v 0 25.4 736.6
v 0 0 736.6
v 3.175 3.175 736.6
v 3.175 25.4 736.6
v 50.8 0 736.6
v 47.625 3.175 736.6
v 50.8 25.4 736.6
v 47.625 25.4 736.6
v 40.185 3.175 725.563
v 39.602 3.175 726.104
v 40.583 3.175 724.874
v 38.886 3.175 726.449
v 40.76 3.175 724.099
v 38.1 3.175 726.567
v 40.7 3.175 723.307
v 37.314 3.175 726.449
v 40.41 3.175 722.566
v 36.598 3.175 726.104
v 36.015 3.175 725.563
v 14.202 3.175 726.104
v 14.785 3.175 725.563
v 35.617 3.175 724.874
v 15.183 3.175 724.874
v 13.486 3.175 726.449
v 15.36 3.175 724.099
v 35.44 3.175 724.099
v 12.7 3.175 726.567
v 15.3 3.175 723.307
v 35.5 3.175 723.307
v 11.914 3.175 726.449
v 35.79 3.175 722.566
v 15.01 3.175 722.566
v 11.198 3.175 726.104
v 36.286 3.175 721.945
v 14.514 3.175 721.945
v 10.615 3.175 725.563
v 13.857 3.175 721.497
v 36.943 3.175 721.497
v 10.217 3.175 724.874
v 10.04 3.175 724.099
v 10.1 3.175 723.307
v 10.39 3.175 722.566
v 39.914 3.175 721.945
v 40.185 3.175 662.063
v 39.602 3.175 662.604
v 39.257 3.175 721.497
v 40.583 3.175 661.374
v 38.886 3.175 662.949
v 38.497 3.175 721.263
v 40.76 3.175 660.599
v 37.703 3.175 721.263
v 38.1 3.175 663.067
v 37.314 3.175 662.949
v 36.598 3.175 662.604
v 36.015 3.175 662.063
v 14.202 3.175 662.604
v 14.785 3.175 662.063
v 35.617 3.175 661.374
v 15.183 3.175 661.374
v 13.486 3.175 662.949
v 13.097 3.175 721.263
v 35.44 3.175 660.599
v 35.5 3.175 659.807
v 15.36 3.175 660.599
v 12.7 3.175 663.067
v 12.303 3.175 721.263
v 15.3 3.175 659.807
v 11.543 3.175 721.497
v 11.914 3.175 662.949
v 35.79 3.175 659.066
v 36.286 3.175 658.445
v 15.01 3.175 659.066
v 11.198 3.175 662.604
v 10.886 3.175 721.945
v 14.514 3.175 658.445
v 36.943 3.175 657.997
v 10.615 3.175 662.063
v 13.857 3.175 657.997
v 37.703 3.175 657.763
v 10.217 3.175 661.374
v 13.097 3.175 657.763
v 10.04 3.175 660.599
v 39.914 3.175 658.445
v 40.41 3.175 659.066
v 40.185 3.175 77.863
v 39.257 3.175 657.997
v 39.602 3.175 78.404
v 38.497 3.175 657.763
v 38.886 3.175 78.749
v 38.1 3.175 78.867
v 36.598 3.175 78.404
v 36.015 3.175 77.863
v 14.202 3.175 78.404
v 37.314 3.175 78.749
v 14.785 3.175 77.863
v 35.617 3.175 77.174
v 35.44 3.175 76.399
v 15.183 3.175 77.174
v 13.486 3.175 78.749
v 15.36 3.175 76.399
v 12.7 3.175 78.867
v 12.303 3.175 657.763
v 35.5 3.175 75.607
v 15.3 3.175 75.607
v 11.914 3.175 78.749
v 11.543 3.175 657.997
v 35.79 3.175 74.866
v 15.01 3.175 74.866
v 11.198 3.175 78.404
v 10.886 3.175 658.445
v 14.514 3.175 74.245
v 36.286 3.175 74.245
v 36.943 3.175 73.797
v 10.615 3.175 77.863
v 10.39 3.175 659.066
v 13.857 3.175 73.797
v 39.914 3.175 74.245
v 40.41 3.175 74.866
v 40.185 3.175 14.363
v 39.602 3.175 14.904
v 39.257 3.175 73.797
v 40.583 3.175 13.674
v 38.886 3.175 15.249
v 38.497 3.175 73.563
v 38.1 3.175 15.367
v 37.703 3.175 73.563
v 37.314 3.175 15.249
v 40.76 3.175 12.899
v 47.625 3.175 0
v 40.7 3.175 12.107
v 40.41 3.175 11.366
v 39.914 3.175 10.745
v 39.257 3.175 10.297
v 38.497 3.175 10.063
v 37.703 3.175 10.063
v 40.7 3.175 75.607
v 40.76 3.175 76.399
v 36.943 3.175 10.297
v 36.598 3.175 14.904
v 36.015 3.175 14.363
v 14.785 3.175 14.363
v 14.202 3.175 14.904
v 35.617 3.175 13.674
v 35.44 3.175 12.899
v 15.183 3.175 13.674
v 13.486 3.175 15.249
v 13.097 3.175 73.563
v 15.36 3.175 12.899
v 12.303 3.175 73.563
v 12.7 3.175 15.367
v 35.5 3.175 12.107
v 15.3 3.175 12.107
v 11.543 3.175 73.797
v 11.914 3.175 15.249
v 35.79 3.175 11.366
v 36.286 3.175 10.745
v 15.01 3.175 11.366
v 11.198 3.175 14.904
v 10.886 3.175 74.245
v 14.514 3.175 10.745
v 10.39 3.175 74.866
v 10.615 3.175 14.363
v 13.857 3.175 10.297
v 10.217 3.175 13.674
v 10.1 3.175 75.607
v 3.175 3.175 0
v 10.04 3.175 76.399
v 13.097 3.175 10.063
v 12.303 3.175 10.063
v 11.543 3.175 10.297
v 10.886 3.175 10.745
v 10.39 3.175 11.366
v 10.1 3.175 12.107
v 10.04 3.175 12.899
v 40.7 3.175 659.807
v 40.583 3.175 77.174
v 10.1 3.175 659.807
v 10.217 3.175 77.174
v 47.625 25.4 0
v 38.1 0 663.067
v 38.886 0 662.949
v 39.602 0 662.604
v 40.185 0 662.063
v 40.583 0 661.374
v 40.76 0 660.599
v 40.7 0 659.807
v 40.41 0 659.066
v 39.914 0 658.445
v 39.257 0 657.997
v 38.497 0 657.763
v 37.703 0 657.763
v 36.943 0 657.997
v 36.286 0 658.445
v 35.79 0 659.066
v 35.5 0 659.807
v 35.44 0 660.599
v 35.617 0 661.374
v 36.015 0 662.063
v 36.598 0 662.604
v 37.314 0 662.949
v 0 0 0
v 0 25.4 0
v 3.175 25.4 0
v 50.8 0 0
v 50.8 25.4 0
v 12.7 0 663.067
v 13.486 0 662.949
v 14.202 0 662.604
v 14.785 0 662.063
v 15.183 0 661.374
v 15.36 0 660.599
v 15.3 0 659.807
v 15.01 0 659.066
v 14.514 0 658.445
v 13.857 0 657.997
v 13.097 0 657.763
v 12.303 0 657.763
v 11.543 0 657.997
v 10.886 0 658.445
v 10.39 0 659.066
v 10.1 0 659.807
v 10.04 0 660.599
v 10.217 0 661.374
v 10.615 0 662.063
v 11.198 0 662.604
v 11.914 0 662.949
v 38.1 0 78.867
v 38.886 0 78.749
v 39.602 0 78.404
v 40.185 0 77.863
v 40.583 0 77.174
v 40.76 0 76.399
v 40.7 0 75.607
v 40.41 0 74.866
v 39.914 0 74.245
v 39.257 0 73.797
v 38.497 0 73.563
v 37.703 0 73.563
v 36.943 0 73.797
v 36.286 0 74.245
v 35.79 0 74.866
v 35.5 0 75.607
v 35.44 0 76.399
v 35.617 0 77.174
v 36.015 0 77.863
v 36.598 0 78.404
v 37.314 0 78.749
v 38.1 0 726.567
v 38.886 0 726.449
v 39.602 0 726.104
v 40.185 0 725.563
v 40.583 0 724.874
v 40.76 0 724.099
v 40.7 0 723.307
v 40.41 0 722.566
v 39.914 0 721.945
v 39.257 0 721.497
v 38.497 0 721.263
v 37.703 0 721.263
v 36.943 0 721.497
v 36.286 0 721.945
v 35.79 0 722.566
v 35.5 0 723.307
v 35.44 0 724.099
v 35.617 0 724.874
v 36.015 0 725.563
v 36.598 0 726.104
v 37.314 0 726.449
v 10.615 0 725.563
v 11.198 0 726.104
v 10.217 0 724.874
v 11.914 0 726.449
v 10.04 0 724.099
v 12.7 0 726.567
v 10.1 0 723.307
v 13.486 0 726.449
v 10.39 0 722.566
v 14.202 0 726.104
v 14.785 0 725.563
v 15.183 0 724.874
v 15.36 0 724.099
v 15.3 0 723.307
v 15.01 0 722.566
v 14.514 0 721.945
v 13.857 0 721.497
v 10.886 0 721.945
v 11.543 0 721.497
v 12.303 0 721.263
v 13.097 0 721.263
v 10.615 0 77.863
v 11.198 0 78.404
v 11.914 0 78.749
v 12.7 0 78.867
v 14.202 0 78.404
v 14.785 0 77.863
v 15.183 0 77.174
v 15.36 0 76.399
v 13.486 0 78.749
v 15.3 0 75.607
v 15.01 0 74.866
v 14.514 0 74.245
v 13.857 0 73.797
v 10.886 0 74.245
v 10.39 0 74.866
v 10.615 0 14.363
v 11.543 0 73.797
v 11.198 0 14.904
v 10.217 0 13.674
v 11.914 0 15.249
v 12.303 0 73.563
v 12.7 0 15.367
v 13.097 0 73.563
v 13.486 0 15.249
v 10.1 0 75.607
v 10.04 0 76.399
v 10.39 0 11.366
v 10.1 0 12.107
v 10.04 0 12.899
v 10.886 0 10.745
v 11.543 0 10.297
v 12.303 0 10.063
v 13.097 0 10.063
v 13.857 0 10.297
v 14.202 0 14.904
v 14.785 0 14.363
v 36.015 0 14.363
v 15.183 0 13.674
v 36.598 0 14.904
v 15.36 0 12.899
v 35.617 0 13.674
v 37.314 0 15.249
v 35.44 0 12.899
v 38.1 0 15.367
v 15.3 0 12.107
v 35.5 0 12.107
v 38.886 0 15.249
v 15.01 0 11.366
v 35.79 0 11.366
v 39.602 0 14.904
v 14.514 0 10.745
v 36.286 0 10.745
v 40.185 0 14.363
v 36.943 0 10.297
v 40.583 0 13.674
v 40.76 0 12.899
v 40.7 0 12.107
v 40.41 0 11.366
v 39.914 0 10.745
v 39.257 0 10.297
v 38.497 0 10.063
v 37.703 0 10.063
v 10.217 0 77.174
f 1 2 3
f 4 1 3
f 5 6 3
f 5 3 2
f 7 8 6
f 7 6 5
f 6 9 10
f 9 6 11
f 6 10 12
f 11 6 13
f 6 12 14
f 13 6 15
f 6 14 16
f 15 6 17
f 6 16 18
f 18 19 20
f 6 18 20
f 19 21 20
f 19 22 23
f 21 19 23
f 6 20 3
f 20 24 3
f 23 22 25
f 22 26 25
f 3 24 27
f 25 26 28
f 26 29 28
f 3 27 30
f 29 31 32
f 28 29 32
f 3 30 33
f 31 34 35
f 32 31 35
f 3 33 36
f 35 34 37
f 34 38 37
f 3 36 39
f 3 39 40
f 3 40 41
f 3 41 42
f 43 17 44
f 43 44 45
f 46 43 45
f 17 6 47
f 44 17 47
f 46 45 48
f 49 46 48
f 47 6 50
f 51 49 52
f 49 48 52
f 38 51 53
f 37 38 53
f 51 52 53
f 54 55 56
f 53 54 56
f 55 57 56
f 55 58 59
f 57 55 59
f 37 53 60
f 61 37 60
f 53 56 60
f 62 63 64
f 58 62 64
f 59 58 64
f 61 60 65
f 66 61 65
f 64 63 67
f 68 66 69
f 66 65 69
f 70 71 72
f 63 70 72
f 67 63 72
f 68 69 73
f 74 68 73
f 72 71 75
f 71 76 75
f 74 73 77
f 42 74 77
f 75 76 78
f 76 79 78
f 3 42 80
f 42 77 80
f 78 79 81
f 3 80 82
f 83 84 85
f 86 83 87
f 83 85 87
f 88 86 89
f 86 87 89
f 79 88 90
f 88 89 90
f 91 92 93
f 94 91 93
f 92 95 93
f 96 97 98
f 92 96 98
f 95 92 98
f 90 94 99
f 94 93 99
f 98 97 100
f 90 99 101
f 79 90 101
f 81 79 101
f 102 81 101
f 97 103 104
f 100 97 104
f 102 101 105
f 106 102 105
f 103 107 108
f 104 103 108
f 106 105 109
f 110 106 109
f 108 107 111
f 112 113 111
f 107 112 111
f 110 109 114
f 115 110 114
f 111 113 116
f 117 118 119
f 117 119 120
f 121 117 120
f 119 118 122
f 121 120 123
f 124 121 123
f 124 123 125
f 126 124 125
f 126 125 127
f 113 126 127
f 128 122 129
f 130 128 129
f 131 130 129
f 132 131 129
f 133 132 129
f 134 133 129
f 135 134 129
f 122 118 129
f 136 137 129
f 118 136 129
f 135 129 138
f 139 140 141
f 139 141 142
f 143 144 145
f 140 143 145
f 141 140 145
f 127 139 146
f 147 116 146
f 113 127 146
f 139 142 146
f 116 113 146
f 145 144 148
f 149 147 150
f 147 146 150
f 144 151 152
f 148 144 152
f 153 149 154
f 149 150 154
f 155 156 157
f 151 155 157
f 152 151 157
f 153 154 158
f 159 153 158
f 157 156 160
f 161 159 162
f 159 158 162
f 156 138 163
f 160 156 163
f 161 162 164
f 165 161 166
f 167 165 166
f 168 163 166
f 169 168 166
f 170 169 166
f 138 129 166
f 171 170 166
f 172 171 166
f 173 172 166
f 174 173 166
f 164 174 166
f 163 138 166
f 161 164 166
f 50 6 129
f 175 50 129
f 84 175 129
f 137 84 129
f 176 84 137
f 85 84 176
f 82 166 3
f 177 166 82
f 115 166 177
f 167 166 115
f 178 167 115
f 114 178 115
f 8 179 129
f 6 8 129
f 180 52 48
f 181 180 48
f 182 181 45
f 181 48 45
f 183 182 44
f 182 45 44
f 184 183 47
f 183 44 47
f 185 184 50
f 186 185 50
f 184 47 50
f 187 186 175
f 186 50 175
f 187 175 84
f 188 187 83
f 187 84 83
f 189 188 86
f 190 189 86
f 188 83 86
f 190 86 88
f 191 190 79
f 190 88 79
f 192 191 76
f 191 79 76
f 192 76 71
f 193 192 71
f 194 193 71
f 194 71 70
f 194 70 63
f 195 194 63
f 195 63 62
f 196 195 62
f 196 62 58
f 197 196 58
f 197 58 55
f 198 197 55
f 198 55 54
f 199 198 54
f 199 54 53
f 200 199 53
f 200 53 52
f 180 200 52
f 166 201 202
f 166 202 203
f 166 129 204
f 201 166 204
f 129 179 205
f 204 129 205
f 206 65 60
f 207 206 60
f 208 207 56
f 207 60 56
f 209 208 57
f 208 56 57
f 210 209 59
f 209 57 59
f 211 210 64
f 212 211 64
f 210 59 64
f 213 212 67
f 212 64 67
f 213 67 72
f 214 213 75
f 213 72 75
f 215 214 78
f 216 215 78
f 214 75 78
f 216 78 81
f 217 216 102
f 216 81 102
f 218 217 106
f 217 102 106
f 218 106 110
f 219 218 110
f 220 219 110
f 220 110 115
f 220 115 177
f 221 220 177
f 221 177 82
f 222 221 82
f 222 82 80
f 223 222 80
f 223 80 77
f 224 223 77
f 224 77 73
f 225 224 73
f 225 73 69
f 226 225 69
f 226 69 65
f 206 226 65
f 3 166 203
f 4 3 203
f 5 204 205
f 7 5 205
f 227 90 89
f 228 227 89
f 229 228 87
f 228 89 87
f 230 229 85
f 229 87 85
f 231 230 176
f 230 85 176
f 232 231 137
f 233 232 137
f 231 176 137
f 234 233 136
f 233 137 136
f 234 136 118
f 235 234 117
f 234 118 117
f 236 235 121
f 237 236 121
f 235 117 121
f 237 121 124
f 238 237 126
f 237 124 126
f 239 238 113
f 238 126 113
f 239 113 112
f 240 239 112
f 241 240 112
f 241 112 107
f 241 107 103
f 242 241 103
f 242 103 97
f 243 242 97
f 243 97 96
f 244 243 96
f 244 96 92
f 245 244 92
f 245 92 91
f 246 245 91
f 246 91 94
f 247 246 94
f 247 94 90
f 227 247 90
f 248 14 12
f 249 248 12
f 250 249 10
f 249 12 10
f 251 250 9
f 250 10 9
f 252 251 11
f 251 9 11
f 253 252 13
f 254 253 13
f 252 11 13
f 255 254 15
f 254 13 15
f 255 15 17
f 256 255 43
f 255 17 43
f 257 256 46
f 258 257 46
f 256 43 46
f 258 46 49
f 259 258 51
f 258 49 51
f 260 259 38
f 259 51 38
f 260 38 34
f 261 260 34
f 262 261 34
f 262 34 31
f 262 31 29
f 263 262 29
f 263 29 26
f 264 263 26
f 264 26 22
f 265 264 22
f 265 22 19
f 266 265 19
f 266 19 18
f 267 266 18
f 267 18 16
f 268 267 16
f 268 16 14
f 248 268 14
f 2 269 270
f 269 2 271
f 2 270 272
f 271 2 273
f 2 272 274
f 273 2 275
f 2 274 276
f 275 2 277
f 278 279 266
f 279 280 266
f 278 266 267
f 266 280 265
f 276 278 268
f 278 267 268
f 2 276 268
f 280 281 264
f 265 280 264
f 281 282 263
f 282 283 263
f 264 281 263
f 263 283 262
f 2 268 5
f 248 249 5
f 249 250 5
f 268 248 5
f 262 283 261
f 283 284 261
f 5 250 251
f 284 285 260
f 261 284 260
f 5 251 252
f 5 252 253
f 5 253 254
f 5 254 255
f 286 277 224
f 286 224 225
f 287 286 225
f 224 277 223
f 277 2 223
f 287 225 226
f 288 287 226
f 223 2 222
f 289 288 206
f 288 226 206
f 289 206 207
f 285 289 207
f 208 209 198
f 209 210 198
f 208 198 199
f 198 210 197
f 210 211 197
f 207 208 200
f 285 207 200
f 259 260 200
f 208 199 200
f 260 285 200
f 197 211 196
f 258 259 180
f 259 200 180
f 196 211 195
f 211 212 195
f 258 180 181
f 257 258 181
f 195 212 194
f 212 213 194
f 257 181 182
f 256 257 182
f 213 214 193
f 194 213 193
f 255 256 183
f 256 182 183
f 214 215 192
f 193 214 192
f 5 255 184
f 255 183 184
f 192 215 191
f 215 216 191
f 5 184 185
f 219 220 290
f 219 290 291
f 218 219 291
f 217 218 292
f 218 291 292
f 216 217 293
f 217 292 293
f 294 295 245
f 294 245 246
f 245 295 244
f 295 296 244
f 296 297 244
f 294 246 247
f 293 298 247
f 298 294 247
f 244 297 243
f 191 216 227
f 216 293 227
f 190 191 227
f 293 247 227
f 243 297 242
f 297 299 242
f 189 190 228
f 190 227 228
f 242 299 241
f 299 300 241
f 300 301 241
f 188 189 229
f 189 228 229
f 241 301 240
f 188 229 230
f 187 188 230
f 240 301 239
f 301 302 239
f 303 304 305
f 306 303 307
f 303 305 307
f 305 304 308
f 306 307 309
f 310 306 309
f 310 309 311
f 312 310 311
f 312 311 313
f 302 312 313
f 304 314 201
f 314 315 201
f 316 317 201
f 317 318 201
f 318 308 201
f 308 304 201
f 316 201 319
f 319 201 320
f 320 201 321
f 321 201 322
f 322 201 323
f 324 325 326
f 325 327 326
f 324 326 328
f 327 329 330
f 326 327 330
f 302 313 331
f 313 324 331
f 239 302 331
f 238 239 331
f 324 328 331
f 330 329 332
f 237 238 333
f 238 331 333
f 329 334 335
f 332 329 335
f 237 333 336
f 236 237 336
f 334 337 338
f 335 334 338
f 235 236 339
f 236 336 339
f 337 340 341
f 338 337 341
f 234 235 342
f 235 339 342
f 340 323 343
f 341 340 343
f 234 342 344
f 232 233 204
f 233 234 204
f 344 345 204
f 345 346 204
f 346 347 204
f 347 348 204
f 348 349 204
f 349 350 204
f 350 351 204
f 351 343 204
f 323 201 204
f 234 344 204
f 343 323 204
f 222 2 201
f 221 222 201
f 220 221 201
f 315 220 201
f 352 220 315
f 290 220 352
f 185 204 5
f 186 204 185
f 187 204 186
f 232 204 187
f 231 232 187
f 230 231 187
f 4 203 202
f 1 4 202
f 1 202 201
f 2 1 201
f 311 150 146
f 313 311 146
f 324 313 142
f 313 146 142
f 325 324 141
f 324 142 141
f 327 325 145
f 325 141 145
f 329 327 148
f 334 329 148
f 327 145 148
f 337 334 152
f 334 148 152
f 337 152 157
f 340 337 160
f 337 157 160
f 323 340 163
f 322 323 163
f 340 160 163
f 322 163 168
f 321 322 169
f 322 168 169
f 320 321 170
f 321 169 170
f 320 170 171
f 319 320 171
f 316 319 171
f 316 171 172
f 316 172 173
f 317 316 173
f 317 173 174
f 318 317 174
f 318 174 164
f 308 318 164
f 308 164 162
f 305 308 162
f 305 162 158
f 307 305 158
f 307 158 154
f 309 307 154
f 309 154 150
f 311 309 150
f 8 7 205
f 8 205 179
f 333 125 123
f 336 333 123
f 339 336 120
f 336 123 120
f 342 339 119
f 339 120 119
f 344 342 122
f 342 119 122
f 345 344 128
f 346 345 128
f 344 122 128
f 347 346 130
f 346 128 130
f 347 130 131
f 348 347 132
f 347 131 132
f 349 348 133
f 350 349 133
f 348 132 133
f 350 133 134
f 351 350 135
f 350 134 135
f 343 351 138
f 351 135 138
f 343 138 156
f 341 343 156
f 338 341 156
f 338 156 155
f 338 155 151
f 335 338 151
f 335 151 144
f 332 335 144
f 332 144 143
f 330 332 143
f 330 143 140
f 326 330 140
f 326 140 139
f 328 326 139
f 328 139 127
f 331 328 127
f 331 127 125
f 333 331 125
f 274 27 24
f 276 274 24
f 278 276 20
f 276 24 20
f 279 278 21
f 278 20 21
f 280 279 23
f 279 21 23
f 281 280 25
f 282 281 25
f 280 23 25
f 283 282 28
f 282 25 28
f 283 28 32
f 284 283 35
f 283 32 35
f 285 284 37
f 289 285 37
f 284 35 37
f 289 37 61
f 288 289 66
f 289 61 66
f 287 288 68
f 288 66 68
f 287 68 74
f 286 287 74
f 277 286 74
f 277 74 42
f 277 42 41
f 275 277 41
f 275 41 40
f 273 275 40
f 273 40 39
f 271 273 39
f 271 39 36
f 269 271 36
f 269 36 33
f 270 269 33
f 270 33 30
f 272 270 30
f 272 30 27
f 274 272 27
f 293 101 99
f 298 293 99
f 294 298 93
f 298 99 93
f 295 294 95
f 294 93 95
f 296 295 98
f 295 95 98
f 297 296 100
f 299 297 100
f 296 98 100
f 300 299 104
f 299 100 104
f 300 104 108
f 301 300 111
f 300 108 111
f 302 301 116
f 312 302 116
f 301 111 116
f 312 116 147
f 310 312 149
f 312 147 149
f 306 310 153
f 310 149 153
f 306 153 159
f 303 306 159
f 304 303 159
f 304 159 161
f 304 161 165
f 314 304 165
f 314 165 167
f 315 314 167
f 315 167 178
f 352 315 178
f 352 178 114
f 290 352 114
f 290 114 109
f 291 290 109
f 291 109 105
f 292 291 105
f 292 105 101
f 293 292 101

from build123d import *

# Parameters (mm, degrees)
EXTRUDE_F_DEPTH    = 736.6
CUT_EXTRUDE1_REACH = 740.684
SKETCH2_R          = 2.667


with BuildPart() as part:
    # Sketch1 → Extrude f (new body)
    with BuildSketch(Plane.XY):
        Polygon((3.175, 3.175), (3.175, 25.4), (0, 25.4), (0, 0), (50.8, 0), (50.8, 25.4), (47.625, 25.4), (47.625, 3.175), align=None)
    extrude(amount=EXTRUDE_F_DEPTH)

    # Sketch2 → Cut-Extrude1 (cut, up to next)
    with BuildSketch(Plane(origin=(0, 3.175, 0), x_dir=(1, 0, 0), z_dir=(0, 1, 0)), mode=Mode.PRIVATE) as cut_extrude1_sk1:
        with Locations(Location((12.7, -723.9, 0), (0, 0, 270))):
            Circle(SKETCH2_R)
    cut_extrude1_tool1 = extrude(cut_extrude1_sk1.sketch, amount=-CUT_EXTRUDE1_REACH, mode=Mode.PRIVATE) & part.part
    # Sketch2 → Cut-Extrude1 (cut, up to next)
    with BuildSketch(Plane(origin=(0, 3.175, 0), x_dir=(1, 0, 0), z_dir=(0, 1, 0)), mode=Mode.PRIVATE) as cut_extrude1_sk2:
        with Locations(Location((12.7, -660.4, 0), (0, 0, 270))):
            Circle(SKETCH2_R)
    cut_extrude1_tool2 = extrude(cut_extrude1_sk2.sketch, amount=-CUT_EXTRUDE1_REACH, mode=Mode.PRIVATE) & part.part
    # Sketch2 → Cut-Extrude1 (cut, up to next)
    with BuildSketch(Plane(origin=(0, 3.175, 0), x_dir=(1, 0, 0), z_dir=(0, 1, 0)), mode=Mode.PRIVATE) as cut_extrude1_sk3:
        with Locations(Location((38.1, -660.4, 0), (0, 0, 270))):
            Circle(SKETCH2_R)
    cut_extrude1_tool3 = extrude(cut_extrude1_sk3.sketch, amount=-CUT_EXTRUDE1_REACH, mode=Mode.PRIVATE) & part.part
    # Sketch2 → Cut-Extrude1 (cut, up to next)
    with BuildSketch(Plane(origin=(0, 3.175, 0), x_dir=(1, 0, 0), z_dir=(0, 1, 0)), mode=Mode.PRIVATE) as cut_extrude1_sk4:
        with Locations(Location((38.1, -723.9, 0), (0, 0, 270))):
            Circle(SKETCH2_R)
    cut_extrude1_tool4 = extrude(cut_extrude1_sk4.sketch, amount=-CUT_EXTRUDE1_REACH, mode=Mode.PRIVATE) & part.part
    # Sketch2 → Cut-Extrude1 (cut, up to next)
    with BuildSketch(Plane(origin=(0, 3.175, 0), x_dir=(1, 0, 0), z_dir=(0, 1, 0)), mode=Mode.PRIVATE) as cut_extrude1_sk5:
        with Locations(Location((38.1, -12.7, 0), (0, 0, 270))):
            Circle(SKETCH2_R)
    cut_extrude1_tool5 = extrude(cut_extrude1_sk5.sketch, amount=-CUT_EXTRUDE1_REACH, mode=Mode.PRIVATE) & part.part
    # Sketch2 → Cut-Extrude1 (cut, up to next)
    with BuildSketch(Plane(origin=(0, 3.175, 0), x_dir=(1, 0, 0), z_dir=(0, 1, 0)), mode=Mode.PRIVATE) as cut_extrude1_sk6:
        with Locations(Location((38.1, -76.2, 0), (0, 0, 270))):
            Circle(SKETCH2_R)
    cut_extrude1_tool6 = extrude(cut_extrude1_sk6.sketch, amount=-CUT_EXTRUDE1_REACH, mode=Mode.PRIVATE) & part.part
    # Sketch2 → Cut-Extrude1 (cut, up to next)
    with BuildSketch(Plane(origin=(0, 3.175, 0), x_dir=(1, 0, 0), z_dir=(0, 1, 0)), mode=Mode.PRIVATE) as cut_extrude1_sk7:
        with Locations(Location((12.7, -12.7, 0), (0, 0, 270))):
            Circle(SKETCH2_R)
    cut_extrude1_tool7 = extrude(cut_extrude1_sk7.sketch, amount=-CUT_EXTRUDE1_REACH, mode=Mode.PRIVATE) & part.part
    # Sketch2 → Cut-Extrude1 (cut, up to next)
    with BuildSketch(Plane(origin=(0, 3.175, 0), x_dir=(1, 0, 0), z_dir=(0, 1, 0)), mode=Mode.PRIVATE) as cut_extrude1_sk8:
        with Locations(Location((12.7, -76.2, 0), (0, 0, 270))):
            Circle(SKETCH2_R)
    cut_extrude1_tool8 = extrude(cut_extrude1_sk8.sketch, amount=-CUT_EXTRUDE1_REACH, mode=Mode.PRIVATE) & part.part
    add(cut_extrude1_tool1.solids().sort_by_distance((12.7, 3.175, 723.9))[0], mode=Mode.SUBTRACT)
    add(cut_extrude1_tool2.solids().sort_by_distance((12.7, 3.175, 660.4))[0], mode=Mode.SUBTRACT)
    add(cut_extrude1_tool3.solids().sort_by_distance((38.1, 3.175, 660.4))[0], mode=Mode.SUBTRACT)
    add(cut_extrude1_tool4.solids().sort_by_distance((38.1, 3.175, 723.9))[0], mode=Mode.SUBTRACT)
    add(cut_extrude1_tool5.solids().sort_by_distance((38.1, 3.175, 12.7))[0], mode=Mode.SUBTRACT)
    add(cut_extrude1_tool6.solids().sort_by_distance((38.1, 3.175, 76.2))[0], mode=Mode.SUBTRACT)
    add(cut_extrude1_tool7.solids().sort_by_distance((12.7, 3.175, 12.7))[0], mode=Mode.SUBTRACT)
    add(cut_extrude1_tool8.solids().sort_by_distance((12.7, 3.175, 76.2))[0], mode=Mode.SUBTRACT)


solid = part.part
